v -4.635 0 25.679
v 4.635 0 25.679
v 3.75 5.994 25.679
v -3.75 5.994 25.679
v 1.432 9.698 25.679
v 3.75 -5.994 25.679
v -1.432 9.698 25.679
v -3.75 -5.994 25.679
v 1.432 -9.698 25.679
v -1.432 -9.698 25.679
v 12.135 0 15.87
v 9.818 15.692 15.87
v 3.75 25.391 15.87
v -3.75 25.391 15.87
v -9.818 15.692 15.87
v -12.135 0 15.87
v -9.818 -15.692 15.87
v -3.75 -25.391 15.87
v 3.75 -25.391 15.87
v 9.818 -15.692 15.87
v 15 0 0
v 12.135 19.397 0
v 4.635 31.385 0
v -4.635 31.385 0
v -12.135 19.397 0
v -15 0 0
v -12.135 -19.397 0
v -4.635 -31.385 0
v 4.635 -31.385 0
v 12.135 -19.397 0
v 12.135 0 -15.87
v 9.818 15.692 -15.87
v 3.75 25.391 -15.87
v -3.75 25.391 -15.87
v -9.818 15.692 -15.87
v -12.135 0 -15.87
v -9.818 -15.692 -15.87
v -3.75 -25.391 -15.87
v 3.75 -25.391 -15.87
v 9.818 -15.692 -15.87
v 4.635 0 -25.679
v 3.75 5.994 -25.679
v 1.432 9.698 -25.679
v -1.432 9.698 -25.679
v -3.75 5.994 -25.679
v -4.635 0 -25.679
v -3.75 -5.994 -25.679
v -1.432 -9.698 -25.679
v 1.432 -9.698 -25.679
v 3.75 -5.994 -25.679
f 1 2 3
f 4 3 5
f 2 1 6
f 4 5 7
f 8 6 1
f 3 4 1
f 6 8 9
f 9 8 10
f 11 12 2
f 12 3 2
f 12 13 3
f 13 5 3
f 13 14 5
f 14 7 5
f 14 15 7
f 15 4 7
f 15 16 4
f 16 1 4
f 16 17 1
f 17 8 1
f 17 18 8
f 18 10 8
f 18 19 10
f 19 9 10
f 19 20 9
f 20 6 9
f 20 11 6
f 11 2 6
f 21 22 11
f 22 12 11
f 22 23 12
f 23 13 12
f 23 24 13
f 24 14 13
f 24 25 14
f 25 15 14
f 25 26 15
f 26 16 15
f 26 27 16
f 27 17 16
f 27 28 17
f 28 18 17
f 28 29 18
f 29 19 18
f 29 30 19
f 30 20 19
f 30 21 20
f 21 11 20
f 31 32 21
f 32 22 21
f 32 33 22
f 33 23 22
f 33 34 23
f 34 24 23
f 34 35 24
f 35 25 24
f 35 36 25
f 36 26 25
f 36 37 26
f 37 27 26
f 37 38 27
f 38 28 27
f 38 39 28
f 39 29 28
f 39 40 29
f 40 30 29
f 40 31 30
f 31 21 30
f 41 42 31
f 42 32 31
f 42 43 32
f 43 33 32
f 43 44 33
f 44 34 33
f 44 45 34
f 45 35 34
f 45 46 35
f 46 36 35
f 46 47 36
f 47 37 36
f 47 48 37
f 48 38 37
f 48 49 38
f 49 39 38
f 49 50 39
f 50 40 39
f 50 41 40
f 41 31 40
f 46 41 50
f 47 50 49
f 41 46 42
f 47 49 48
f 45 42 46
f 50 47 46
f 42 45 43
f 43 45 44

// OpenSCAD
// Generated by SolidPython 1.0.1 on 2020-07-29 00:46:46


scale(v = [5, 11, 9]) {
	sphere(r = 3);
}
/***********************************************
*********      SolidPython code:      **********
************************************************
 
# import packages: SolidPython
from solid import *
from solid.utils import *
from itertools import chain, combinations, permutations


class Resize:

    def __init__(self, scad_file):
        self.scad_file = scad_file
        #self.scad_file = import_scad(scad_file)
        # cone/cylinder param:
        self.r1 = 0
        self.r2 = 0
        self.h = 0
        # rectangular prism param:
        self.w = 0
        self.l = 0
        # ellipse param:
        self.r = 0

    # import OpenScad code (file name corresponds to shape)


    # classify shape + parameters
    def assign(self, param1, param2, param3):
        if self.scad_file == 'cone.scad':
            self.r1 = param1
            self.r2 = param2
            self.h = param3
        elif self.scad_file == 'cylinder.scad':
            self.r1 = param1
            self.r2 = param2
            self.h = param3
        elif self.scad_file == 'rectangularPrism.scad':
            self.h = param1
            self.l = param2
            self.w = param3
        else:
            self.r = param1
            self.h = param2

    # resize parameters
    def iterate(self):
        x = range(3, 20, 2)
        i = 1
        if self.scad_file == 'cone.scad':
            tempList = list(permutations(x, 2))
            for temp in tempList:
                param1 = temp[0]
                param2 = temp[1]
                filepath = 'produced_scad_files/' + 'cone' + str(param1) + '_' + str(param2) + '_' + '.scad'
                scad_render_to_file(cylinder(h=param1, r1=param2, r2=0), filepath)

        elif self.scad_file == 'cylinder.scad':
            tempList = list(permutations(x, 3))
            for temp in tempList:
                param1 = temp[0]
                param2 = temp[1]
                filepath = 'produced_scad_files/' + 'cylinder' + str(param1) + '_' + str(param2) + '_' + '.scad'
                scad_render_to_file(cylinder(h=param1, r1=param2, r2=param2), filepath)

        elif self.scad_file == 'rectangularPrism.scad':
            tempList = list(permutations(x, 3))
            for temp in tempList:
                param1 = temp[0]
                param2 = temp[1]
                param3 = temp[2]
                filepath = 'produced_scad_files/' + 'rectangularPrism' + str(param1) + '_' + str(param2) + '_' + str(
                    param3) + '.scad'
                scad_render_to_file(cube(size=(param1, param2, param3)), filepath)

        elif self.scad_file == 'ellipse.scad':
            tempList = list(permutations(x, 4))
            for temp in tempList:
                param1 = temp[0]
                param2 = temp[1]
                param3 = temp[2]
                param4 = temp[3]
                filepath = 'produced_scad_files/' + 'ellipse' + str(param1) + '_' + str(param2) + '_' + str(param3) + '_' + str(param4) + '.scad'
                scad_render_to_file(scale([param1, param2, param3])(sphere(r=param4)), filepath)

    def render_to_scadfile(self):
        scad_render_to_file(scad, 'example.scad') 
 
************************************************/
